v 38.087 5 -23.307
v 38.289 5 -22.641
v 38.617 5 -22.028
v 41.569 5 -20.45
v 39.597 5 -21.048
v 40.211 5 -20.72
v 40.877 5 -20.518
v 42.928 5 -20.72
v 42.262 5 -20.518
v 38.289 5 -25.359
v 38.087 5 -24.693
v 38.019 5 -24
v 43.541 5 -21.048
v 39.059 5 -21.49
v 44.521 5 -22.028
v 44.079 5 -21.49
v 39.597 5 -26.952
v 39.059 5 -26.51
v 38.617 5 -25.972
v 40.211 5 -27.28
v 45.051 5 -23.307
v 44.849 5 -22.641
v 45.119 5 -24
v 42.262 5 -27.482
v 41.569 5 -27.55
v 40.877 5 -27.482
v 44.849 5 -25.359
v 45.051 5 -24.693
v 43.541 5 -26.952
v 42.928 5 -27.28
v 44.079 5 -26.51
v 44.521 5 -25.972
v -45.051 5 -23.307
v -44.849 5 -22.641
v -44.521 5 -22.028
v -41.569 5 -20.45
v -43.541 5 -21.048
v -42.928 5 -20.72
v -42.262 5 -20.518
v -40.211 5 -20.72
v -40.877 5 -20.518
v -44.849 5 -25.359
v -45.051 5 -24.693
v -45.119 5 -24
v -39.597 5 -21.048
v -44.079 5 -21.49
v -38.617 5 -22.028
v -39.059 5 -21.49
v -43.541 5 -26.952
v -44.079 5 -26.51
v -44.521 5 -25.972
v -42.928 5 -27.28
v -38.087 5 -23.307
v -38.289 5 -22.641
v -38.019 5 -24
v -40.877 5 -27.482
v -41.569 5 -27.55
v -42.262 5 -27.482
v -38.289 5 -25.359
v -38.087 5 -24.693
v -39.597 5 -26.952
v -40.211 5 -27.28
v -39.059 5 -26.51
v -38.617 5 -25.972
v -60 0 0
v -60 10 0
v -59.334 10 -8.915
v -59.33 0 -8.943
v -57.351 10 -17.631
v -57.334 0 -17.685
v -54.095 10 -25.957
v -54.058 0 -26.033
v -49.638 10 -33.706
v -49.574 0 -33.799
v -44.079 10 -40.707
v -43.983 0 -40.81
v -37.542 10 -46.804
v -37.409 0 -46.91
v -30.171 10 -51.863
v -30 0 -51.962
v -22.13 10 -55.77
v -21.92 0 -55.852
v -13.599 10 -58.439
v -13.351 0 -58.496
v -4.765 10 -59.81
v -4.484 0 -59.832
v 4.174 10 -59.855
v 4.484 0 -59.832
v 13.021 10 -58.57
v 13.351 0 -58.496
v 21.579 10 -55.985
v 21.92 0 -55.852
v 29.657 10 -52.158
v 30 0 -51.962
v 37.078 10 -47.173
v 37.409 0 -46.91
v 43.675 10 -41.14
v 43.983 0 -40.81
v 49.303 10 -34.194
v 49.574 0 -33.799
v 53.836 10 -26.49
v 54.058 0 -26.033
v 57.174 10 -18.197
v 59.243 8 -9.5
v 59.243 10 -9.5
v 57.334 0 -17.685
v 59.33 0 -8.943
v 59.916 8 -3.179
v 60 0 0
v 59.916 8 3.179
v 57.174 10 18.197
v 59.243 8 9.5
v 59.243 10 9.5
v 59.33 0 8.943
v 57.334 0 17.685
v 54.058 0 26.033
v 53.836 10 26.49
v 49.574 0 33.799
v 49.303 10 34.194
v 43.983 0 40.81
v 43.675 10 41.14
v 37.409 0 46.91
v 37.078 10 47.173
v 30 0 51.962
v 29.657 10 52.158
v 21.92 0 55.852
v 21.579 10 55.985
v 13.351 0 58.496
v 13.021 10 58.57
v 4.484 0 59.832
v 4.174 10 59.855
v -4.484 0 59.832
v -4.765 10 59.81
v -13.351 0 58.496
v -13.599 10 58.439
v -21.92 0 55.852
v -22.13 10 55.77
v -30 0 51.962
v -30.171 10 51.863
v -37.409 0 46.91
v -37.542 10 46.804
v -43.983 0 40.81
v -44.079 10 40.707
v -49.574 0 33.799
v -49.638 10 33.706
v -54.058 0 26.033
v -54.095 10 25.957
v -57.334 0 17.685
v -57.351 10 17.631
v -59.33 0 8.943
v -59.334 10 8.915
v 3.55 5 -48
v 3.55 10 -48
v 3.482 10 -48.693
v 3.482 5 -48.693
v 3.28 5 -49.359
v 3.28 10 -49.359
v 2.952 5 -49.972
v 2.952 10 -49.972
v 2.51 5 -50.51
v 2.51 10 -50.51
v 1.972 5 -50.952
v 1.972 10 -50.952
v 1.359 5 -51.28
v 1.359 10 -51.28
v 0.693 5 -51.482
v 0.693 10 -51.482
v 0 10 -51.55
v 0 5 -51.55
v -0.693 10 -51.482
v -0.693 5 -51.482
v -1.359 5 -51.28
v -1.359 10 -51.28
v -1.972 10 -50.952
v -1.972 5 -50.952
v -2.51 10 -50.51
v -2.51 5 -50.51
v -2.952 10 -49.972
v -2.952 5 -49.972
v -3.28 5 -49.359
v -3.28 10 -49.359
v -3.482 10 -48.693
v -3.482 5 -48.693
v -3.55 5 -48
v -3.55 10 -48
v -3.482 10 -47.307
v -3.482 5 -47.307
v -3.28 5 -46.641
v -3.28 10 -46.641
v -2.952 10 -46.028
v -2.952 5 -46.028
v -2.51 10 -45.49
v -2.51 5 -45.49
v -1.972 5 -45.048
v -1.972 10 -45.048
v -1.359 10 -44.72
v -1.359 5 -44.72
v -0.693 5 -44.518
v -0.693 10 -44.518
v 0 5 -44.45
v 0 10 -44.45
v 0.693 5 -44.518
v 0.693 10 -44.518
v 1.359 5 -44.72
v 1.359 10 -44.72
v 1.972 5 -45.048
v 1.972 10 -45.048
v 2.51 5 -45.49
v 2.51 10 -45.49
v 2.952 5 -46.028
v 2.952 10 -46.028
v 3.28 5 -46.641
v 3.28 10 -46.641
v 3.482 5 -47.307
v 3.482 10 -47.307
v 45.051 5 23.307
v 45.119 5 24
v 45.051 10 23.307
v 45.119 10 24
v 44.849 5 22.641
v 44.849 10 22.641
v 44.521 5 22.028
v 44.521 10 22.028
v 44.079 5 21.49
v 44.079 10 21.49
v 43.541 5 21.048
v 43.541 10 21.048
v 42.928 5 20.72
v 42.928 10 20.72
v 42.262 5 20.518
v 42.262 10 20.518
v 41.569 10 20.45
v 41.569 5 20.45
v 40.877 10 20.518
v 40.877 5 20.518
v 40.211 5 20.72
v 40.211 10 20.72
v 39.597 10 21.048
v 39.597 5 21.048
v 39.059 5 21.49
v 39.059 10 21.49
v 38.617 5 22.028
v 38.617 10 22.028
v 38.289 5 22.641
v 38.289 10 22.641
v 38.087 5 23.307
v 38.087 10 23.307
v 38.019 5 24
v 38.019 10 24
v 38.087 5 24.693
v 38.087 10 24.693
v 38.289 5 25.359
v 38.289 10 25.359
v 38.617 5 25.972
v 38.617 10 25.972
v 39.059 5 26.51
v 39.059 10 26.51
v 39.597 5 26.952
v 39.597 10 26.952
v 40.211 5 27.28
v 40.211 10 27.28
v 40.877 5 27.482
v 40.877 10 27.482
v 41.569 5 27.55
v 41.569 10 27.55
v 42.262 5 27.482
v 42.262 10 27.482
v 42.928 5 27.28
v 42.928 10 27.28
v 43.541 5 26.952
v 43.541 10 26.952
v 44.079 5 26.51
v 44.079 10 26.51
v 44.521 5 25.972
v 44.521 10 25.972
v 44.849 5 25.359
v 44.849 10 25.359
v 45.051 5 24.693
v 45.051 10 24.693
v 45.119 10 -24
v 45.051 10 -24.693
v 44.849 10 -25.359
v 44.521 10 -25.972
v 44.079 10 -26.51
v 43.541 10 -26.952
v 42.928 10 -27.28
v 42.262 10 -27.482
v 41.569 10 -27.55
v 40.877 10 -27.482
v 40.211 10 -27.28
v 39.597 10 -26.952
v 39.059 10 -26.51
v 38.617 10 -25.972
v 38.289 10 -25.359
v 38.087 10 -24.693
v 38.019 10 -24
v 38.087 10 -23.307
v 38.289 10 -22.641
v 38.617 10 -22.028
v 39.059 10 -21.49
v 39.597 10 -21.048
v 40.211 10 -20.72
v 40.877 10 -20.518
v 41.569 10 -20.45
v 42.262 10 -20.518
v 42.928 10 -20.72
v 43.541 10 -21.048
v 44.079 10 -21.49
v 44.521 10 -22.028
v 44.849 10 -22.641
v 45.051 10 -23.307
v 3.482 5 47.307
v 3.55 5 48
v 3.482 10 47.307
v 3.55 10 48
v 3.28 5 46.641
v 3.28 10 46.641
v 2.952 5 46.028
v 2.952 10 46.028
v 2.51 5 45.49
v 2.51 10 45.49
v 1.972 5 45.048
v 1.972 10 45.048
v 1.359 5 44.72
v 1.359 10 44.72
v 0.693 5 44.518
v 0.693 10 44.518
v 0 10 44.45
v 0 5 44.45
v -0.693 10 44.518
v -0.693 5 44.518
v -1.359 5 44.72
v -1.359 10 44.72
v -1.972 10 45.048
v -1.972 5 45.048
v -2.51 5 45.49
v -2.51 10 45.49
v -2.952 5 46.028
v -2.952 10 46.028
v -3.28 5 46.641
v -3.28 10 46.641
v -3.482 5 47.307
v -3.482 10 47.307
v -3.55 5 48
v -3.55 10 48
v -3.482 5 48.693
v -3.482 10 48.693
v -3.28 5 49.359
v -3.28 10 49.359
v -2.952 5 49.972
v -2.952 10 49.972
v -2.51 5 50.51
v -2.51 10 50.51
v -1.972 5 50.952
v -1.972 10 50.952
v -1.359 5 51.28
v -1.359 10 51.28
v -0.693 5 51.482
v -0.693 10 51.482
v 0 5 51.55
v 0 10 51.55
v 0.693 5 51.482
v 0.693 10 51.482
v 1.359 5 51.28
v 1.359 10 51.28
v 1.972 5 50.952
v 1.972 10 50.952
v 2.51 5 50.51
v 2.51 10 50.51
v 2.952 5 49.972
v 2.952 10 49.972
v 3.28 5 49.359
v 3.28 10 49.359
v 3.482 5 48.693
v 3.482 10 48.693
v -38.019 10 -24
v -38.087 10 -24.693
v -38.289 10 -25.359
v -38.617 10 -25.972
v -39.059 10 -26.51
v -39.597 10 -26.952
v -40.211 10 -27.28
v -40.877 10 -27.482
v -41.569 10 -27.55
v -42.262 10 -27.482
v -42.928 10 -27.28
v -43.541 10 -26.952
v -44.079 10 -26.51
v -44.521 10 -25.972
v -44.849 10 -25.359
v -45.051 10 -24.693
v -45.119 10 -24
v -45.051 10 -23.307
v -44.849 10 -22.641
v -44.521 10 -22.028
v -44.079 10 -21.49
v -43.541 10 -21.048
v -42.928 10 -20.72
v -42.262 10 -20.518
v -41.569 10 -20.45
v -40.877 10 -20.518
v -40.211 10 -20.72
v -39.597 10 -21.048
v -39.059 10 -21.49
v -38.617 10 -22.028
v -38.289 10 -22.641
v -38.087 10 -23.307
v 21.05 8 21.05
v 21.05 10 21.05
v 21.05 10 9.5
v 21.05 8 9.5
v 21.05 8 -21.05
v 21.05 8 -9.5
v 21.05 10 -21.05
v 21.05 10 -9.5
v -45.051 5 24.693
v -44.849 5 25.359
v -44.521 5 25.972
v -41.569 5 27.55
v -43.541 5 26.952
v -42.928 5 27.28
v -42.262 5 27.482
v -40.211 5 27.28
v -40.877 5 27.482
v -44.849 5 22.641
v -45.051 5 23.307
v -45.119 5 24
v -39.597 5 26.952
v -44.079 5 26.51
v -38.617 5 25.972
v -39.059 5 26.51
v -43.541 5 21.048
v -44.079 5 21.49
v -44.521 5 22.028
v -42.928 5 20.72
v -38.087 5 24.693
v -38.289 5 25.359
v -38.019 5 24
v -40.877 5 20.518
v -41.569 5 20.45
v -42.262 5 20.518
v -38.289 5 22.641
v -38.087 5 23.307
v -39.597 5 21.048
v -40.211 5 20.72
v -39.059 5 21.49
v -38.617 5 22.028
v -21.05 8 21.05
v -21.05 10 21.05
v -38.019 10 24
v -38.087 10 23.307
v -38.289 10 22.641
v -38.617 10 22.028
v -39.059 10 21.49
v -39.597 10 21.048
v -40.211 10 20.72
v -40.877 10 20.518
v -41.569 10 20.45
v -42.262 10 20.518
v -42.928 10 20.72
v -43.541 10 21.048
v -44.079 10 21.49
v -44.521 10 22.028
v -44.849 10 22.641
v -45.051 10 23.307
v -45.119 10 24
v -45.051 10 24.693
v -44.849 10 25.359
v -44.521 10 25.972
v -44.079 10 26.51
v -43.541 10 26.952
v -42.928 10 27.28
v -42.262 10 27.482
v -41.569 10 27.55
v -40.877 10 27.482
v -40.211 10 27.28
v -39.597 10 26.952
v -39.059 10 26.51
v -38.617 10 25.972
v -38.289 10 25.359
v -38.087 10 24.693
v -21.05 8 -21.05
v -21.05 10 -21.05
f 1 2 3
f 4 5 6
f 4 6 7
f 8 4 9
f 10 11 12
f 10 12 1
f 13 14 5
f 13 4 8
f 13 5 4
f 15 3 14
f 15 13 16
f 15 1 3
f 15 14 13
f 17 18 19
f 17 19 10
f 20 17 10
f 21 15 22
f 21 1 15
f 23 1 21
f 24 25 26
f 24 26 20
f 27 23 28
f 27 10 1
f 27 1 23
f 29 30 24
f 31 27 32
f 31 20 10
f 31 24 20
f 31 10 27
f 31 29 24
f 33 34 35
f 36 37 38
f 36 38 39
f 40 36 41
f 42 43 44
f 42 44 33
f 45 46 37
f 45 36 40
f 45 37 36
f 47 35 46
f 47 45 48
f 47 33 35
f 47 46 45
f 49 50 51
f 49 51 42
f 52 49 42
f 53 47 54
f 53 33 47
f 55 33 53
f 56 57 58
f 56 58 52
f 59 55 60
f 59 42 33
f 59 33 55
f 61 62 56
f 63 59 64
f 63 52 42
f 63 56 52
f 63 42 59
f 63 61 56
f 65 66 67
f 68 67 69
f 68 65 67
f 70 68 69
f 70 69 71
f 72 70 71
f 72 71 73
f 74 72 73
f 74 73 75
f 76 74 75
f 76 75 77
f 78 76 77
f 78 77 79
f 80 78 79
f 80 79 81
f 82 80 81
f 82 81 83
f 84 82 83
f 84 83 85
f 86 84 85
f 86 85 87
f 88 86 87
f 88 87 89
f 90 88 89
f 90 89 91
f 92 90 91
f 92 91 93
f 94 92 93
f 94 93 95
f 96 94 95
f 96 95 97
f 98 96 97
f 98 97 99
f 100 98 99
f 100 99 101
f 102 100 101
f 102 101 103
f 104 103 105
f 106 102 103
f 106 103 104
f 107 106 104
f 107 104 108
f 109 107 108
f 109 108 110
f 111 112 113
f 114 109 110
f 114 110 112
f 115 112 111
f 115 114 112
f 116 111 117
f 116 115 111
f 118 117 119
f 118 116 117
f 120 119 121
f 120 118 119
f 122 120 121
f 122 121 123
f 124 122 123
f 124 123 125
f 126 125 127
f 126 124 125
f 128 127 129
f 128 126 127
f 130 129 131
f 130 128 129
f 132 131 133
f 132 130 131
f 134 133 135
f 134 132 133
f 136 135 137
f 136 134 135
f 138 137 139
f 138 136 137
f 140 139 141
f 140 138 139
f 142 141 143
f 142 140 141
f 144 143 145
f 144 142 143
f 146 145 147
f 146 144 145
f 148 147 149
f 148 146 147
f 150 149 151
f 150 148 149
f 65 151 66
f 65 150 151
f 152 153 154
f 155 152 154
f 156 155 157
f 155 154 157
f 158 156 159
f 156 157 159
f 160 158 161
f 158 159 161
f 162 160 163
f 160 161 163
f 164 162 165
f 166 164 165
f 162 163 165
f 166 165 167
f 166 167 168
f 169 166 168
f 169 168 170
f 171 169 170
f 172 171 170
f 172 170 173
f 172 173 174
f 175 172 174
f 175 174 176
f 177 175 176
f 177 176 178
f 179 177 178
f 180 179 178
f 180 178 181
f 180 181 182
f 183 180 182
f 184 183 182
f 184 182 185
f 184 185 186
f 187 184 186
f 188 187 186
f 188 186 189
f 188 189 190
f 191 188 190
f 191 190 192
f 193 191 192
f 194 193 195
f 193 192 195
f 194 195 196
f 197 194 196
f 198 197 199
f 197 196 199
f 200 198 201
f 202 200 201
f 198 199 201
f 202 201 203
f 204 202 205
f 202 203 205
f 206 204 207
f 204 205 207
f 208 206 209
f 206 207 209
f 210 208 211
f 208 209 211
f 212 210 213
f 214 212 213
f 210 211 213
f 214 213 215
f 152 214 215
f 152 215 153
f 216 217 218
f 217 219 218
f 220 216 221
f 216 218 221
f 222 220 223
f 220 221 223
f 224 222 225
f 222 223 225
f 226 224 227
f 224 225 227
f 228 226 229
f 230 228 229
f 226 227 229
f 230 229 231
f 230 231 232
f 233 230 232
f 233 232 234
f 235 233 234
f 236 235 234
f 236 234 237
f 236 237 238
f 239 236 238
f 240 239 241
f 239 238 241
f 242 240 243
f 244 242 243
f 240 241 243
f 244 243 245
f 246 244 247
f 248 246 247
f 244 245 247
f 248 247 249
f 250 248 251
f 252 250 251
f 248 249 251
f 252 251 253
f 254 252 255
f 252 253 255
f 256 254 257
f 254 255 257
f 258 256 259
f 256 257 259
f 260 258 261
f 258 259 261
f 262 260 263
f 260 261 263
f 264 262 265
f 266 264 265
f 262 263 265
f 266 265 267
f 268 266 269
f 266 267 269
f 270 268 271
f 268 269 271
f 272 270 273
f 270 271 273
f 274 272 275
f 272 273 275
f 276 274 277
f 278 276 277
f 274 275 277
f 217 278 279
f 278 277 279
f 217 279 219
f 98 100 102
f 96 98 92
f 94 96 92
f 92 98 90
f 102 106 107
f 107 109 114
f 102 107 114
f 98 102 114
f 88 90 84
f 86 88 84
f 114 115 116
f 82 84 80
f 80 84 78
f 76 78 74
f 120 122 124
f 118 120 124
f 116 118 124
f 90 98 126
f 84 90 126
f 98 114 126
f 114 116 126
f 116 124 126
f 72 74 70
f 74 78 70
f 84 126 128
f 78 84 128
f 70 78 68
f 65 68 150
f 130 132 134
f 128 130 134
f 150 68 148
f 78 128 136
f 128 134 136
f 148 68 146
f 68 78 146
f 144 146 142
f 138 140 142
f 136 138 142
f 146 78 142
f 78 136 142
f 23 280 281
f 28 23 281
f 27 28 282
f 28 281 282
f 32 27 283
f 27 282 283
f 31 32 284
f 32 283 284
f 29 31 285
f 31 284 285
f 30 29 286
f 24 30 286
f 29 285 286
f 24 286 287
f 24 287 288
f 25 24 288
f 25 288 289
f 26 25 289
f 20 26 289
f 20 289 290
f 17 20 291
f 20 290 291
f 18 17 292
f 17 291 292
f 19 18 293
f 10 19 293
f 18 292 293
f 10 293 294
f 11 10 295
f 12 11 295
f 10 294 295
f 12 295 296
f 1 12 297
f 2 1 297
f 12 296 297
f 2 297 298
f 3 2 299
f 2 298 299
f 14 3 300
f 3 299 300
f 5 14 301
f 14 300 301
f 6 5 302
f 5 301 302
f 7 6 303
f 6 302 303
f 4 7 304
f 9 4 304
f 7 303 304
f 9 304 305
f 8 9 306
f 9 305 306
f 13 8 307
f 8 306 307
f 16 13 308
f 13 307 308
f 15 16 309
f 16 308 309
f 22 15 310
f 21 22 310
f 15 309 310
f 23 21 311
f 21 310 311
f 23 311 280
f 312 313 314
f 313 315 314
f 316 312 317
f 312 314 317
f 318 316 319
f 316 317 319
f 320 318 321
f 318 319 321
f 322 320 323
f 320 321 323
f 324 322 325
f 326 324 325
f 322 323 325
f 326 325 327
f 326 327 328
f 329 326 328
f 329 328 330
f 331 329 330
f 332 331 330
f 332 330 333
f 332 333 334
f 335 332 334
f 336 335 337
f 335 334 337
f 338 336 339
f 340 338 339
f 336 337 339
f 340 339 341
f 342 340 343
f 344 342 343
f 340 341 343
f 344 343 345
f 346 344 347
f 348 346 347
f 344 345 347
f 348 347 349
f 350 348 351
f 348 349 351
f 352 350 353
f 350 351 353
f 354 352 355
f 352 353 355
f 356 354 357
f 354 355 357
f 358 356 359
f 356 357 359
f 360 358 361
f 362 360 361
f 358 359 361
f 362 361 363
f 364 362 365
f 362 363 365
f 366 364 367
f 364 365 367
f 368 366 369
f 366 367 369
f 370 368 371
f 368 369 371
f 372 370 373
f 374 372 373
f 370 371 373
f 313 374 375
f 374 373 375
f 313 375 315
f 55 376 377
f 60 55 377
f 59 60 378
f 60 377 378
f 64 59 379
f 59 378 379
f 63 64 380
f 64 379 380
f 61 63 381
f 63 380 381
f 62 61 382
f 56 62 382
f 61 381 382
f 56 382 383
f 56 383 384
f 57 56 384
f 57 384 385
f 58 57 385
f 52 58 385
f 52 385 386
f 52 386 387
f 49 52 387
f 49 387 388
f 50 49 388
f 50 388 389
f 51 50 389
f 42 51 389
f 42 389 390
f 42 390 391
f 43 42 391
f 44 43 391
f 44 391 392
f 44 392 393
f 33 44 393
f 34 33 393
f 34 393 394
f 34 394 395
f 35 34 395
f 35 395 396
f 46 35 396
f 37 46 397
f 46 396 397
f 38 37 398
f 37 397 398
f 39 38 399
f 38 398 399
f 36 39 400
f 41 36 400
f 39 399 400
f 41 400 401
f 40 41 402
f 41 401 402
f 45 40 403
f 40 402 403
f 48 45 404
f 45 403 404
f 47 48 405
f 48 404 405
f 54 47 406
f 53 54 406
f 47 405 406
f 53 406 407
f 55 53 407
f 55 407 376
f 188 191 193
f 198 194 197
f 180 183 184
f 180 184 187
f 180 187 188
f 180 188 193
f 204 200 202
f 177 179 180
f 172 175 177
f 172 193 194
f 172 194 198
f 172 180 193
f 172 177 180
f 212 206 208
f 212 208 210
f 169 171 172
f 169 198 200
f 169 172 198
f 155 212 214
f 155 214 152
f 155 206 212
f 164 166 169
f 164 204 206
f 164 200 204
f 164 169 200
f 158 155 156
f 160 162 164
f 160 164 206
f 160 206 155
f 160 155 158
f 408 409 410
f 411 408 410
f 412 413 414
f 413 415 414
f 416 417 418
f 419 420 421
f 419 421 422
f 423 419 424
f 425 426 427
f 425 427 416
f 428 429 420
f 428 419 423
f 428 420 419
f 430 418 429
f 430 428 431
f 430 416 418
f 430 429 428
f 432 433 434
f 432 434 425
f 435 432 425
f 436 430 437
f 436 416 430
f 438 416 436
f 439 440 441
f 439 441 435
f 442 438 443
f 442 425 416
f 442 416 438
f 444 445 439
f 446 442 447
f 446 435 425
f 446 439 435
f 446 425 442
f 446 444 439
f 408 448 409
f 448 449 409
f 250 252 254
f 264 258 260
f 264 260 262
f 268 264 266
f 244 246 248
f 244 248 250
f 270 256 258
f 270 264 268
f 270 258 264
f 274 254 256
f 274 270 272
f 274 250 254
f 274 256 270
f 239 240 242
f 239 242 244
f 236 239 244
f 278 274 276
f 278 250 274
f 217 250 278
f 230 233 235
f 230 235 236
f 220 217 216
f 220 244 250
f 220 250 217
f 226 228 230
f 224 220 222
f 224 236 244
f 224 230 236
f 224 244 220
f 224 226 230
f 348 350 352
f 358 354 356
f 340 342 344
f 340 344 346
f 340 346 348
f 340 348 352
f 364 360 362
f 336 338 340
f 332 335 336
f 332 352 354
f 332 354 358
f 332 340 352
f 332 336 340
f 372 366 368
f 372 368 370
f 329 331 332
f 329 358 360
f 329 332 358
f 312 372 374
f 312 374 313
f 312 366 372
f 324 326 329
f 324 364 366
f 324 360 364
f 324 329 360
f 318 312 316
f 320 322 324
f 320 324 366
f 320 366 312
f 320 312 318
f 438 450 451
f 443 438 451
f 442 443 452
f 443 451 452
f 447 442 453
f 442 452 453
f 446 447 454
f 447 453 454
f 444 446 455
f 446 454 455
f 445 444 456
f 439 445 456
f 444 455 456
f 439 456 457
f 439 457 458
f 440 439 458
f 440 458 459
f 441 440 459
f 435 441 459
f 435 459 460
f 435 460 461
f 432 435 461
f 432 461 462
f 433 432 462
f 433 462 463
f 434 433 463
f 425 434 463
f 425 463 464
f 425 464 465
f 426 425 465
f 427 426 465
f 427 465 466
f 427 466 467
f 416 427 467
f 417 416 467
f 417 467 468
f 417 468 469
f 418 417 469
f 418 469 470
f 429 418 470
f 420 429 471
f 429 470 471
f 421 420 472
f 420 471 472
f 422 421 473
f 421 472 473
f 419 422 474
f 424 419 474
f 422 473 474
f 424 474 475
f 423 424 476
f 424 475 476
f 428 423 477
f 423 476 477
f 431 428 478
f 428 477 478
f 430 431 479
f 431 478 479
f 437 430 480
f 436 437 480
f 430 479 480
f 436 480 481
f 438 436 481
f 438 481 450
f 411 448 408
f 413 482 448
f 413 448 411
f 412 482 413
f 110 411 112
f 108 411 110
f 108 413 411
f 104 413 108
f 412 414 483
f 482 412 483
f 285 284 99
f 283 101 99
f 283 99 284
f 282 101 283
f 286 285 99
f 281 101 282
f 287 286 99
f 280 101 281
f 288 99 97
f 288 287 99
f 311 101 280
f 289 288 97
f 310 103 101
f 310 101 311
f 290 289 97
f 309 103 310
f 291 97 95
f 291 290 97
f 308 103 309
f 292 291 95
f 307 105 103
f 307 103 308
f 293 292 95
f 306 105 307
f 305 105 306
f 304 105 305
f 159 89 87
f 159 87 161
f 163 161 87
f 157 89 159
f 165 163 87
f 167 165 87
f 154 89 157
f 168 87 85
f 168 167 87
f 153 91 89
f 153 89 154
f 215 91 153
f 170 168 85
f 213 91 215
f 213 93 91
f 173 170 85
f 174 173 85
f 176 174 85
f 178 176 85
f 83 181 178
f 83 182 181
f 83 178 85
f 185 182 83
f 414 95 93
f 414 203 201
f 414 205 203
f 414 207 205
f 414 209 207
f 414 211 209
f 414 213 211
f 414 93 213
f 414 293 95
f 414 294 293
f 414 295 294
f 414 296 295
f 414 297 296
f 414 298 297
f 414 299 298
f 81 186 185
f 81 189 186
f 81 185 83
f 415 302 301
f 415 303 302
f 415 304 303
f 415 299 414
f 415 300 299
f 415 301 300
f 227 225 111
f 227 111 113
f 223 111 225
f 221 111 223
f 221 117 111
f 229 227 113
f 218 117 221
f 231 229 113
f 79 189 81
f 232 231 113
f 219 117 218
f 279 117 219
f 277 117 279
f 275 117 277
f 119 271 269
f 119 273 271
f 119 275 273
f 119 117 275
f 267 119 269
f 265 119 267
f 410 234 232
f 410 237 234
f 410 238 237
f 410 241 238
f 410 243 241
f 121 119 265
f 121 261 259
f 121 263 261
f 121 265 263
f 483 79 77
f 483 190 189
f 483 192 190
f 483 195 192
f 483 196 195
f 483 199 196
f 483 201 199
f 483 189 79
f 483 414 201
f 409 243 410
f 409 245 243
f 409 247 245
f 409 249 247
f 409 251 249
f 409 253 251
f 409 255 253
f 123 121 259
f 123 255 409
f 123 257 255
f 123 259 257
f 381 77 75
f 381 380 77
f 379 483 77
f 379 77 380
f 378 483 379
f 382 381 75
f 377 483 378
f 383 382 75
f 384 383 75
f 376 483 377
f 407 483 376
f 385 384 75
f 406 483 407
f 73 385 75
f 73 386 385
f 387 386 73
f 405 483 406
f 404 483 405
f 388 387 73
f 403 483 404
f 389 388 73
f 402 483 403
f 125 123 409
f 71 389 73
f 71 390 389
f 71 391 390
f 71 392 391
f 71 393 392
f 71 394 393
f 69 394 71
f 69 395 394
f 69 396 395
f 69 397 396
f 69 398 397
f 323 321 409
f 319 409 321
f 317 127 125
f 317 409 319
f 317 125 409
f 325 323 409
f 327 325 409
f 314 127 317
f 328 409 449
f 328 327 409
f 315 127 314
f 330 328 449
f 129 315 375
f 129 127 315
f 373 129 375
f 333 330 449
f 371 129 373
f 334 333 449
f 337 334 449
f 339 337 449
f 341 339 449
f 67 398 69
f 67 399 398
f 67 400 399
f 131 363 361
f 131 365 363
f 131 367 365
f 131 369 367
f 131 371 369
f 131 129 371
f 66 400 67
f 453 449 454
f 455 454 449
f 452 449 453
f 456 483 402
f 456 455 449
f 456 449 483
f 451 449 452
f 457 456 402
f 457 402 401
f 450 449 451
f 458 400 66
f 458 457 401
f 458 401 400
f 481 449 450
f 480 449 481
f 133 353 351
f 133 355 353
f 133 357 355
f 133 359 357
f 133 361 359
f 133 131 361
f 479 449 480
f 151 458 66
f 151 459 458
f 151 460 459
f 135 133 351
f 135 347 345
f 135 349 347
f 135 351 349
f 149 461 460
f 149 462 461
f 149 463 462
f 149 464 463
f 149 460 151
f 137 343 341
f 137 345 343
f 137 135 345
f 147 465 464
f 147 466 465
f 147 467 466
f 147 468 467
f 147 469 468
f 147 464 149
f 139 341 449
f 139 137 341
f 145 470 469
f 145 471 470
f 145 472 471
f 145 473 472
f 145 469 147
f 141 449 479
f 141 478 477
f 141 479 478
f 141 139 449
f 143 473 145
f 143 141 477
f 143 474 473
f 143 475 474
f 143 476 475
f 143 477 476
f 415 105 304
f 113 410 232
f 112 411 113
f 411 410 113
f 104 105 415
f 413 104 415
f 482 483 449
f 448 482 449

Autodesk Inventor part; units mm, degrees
ref_plane "YZ Plane" through (0, 0, 0) normal (1, 0, 0) x (0, 1, 0)
ref_plane "XZ Plane" through (0, 0, 0) normal (0, 1, 0) x (-1, 0, 0)
ref_plane "XY Plane" through (0, 0, 0) normal (0, 0, 1) x (1, 0, 0)
sketch "Szkic1" plane through (0, 0, 0) normal (0, 1, 0) x (-1, 0, 0)
  circle A0 centre (0, 0) radius 60
  dimension "d0" = 120
extrude "Wyciągnięcie proste1" add sketch "Szkic1" along normal blind 10
sketch "Szkic2" plane through (0, 10, 0) normal (0, 1, 0) x (1, 0, 0)
  circle A0 centre (0, 48) radius 3.55
  circle A1 centre (-41.5692, 24) radius 3.55
  circle A2 centre (-41.5692, -24) radius 3.55
  circle A3 centre (0, -48) radius 3.55
  circle A4 centre (41.5692, -24) radius 3.55
  circle A5 centre (41.5692, 24) radius 3.55
  point P0 (0, 0)
  dimension "d13" = 7.1
  dimension "d16" = 360
  dimension "d20" = 48
extrude "Wyciągnięcie proste2" cut sketch "Szkic2" against normal blind 5
sketch "Szkic3" plane through (0, 10, 0) normal (0, 1, 0) x (1, 0, 0)
  line L0 (-21.05, -21.05) -> (21.05, -21.05)
  line L1 (21.05, -21.05) -> (21.05, 21.05)
  line L2 (21.05, 21.05) -> (-21.05, 21.05)
  line L3 (-21.05, 21.05) -> (-21.05, -21.05)
  line L4 (-21.05, -21.05) -> (21.05, 21.05)
  line L5 (-21.05, 21.05) -> (21.05, -21.05)
  point P0 (0, 0)
  point P1 (0, 0)
  dimension "d21" = 42.1
  dimension "d22" = 42.1
extrude "Wyciągnięcie proste3" cut sketch "Szkic3" against normal blind 2
sketch "Szkic4" plane through (0, 10, 0) normal (0, 1, 0) x (1, 0, 0)
  line L0 (21.05, 21.05) -> (21.05, -21.05) projected
  line L1 (21.05, -9.5) -> (61.05, -9.5)
  line L2 (61.05, -9.5) -> (61.05, 9.5)
  line L3 (61.05, 9.5) -> (21.05, 9.5)
  line L4 (21.05, 9.5) -> (21.05, -9.5)
  point P0 (0, 0)
  point P1 (21.05, 0)
  dimension "d25" = 19
  dimension "d26" = 40
extrude "Wyciągnięcie proste4" cut sketch "Szkic4" against normal blind 2
properties part number "Base1"
